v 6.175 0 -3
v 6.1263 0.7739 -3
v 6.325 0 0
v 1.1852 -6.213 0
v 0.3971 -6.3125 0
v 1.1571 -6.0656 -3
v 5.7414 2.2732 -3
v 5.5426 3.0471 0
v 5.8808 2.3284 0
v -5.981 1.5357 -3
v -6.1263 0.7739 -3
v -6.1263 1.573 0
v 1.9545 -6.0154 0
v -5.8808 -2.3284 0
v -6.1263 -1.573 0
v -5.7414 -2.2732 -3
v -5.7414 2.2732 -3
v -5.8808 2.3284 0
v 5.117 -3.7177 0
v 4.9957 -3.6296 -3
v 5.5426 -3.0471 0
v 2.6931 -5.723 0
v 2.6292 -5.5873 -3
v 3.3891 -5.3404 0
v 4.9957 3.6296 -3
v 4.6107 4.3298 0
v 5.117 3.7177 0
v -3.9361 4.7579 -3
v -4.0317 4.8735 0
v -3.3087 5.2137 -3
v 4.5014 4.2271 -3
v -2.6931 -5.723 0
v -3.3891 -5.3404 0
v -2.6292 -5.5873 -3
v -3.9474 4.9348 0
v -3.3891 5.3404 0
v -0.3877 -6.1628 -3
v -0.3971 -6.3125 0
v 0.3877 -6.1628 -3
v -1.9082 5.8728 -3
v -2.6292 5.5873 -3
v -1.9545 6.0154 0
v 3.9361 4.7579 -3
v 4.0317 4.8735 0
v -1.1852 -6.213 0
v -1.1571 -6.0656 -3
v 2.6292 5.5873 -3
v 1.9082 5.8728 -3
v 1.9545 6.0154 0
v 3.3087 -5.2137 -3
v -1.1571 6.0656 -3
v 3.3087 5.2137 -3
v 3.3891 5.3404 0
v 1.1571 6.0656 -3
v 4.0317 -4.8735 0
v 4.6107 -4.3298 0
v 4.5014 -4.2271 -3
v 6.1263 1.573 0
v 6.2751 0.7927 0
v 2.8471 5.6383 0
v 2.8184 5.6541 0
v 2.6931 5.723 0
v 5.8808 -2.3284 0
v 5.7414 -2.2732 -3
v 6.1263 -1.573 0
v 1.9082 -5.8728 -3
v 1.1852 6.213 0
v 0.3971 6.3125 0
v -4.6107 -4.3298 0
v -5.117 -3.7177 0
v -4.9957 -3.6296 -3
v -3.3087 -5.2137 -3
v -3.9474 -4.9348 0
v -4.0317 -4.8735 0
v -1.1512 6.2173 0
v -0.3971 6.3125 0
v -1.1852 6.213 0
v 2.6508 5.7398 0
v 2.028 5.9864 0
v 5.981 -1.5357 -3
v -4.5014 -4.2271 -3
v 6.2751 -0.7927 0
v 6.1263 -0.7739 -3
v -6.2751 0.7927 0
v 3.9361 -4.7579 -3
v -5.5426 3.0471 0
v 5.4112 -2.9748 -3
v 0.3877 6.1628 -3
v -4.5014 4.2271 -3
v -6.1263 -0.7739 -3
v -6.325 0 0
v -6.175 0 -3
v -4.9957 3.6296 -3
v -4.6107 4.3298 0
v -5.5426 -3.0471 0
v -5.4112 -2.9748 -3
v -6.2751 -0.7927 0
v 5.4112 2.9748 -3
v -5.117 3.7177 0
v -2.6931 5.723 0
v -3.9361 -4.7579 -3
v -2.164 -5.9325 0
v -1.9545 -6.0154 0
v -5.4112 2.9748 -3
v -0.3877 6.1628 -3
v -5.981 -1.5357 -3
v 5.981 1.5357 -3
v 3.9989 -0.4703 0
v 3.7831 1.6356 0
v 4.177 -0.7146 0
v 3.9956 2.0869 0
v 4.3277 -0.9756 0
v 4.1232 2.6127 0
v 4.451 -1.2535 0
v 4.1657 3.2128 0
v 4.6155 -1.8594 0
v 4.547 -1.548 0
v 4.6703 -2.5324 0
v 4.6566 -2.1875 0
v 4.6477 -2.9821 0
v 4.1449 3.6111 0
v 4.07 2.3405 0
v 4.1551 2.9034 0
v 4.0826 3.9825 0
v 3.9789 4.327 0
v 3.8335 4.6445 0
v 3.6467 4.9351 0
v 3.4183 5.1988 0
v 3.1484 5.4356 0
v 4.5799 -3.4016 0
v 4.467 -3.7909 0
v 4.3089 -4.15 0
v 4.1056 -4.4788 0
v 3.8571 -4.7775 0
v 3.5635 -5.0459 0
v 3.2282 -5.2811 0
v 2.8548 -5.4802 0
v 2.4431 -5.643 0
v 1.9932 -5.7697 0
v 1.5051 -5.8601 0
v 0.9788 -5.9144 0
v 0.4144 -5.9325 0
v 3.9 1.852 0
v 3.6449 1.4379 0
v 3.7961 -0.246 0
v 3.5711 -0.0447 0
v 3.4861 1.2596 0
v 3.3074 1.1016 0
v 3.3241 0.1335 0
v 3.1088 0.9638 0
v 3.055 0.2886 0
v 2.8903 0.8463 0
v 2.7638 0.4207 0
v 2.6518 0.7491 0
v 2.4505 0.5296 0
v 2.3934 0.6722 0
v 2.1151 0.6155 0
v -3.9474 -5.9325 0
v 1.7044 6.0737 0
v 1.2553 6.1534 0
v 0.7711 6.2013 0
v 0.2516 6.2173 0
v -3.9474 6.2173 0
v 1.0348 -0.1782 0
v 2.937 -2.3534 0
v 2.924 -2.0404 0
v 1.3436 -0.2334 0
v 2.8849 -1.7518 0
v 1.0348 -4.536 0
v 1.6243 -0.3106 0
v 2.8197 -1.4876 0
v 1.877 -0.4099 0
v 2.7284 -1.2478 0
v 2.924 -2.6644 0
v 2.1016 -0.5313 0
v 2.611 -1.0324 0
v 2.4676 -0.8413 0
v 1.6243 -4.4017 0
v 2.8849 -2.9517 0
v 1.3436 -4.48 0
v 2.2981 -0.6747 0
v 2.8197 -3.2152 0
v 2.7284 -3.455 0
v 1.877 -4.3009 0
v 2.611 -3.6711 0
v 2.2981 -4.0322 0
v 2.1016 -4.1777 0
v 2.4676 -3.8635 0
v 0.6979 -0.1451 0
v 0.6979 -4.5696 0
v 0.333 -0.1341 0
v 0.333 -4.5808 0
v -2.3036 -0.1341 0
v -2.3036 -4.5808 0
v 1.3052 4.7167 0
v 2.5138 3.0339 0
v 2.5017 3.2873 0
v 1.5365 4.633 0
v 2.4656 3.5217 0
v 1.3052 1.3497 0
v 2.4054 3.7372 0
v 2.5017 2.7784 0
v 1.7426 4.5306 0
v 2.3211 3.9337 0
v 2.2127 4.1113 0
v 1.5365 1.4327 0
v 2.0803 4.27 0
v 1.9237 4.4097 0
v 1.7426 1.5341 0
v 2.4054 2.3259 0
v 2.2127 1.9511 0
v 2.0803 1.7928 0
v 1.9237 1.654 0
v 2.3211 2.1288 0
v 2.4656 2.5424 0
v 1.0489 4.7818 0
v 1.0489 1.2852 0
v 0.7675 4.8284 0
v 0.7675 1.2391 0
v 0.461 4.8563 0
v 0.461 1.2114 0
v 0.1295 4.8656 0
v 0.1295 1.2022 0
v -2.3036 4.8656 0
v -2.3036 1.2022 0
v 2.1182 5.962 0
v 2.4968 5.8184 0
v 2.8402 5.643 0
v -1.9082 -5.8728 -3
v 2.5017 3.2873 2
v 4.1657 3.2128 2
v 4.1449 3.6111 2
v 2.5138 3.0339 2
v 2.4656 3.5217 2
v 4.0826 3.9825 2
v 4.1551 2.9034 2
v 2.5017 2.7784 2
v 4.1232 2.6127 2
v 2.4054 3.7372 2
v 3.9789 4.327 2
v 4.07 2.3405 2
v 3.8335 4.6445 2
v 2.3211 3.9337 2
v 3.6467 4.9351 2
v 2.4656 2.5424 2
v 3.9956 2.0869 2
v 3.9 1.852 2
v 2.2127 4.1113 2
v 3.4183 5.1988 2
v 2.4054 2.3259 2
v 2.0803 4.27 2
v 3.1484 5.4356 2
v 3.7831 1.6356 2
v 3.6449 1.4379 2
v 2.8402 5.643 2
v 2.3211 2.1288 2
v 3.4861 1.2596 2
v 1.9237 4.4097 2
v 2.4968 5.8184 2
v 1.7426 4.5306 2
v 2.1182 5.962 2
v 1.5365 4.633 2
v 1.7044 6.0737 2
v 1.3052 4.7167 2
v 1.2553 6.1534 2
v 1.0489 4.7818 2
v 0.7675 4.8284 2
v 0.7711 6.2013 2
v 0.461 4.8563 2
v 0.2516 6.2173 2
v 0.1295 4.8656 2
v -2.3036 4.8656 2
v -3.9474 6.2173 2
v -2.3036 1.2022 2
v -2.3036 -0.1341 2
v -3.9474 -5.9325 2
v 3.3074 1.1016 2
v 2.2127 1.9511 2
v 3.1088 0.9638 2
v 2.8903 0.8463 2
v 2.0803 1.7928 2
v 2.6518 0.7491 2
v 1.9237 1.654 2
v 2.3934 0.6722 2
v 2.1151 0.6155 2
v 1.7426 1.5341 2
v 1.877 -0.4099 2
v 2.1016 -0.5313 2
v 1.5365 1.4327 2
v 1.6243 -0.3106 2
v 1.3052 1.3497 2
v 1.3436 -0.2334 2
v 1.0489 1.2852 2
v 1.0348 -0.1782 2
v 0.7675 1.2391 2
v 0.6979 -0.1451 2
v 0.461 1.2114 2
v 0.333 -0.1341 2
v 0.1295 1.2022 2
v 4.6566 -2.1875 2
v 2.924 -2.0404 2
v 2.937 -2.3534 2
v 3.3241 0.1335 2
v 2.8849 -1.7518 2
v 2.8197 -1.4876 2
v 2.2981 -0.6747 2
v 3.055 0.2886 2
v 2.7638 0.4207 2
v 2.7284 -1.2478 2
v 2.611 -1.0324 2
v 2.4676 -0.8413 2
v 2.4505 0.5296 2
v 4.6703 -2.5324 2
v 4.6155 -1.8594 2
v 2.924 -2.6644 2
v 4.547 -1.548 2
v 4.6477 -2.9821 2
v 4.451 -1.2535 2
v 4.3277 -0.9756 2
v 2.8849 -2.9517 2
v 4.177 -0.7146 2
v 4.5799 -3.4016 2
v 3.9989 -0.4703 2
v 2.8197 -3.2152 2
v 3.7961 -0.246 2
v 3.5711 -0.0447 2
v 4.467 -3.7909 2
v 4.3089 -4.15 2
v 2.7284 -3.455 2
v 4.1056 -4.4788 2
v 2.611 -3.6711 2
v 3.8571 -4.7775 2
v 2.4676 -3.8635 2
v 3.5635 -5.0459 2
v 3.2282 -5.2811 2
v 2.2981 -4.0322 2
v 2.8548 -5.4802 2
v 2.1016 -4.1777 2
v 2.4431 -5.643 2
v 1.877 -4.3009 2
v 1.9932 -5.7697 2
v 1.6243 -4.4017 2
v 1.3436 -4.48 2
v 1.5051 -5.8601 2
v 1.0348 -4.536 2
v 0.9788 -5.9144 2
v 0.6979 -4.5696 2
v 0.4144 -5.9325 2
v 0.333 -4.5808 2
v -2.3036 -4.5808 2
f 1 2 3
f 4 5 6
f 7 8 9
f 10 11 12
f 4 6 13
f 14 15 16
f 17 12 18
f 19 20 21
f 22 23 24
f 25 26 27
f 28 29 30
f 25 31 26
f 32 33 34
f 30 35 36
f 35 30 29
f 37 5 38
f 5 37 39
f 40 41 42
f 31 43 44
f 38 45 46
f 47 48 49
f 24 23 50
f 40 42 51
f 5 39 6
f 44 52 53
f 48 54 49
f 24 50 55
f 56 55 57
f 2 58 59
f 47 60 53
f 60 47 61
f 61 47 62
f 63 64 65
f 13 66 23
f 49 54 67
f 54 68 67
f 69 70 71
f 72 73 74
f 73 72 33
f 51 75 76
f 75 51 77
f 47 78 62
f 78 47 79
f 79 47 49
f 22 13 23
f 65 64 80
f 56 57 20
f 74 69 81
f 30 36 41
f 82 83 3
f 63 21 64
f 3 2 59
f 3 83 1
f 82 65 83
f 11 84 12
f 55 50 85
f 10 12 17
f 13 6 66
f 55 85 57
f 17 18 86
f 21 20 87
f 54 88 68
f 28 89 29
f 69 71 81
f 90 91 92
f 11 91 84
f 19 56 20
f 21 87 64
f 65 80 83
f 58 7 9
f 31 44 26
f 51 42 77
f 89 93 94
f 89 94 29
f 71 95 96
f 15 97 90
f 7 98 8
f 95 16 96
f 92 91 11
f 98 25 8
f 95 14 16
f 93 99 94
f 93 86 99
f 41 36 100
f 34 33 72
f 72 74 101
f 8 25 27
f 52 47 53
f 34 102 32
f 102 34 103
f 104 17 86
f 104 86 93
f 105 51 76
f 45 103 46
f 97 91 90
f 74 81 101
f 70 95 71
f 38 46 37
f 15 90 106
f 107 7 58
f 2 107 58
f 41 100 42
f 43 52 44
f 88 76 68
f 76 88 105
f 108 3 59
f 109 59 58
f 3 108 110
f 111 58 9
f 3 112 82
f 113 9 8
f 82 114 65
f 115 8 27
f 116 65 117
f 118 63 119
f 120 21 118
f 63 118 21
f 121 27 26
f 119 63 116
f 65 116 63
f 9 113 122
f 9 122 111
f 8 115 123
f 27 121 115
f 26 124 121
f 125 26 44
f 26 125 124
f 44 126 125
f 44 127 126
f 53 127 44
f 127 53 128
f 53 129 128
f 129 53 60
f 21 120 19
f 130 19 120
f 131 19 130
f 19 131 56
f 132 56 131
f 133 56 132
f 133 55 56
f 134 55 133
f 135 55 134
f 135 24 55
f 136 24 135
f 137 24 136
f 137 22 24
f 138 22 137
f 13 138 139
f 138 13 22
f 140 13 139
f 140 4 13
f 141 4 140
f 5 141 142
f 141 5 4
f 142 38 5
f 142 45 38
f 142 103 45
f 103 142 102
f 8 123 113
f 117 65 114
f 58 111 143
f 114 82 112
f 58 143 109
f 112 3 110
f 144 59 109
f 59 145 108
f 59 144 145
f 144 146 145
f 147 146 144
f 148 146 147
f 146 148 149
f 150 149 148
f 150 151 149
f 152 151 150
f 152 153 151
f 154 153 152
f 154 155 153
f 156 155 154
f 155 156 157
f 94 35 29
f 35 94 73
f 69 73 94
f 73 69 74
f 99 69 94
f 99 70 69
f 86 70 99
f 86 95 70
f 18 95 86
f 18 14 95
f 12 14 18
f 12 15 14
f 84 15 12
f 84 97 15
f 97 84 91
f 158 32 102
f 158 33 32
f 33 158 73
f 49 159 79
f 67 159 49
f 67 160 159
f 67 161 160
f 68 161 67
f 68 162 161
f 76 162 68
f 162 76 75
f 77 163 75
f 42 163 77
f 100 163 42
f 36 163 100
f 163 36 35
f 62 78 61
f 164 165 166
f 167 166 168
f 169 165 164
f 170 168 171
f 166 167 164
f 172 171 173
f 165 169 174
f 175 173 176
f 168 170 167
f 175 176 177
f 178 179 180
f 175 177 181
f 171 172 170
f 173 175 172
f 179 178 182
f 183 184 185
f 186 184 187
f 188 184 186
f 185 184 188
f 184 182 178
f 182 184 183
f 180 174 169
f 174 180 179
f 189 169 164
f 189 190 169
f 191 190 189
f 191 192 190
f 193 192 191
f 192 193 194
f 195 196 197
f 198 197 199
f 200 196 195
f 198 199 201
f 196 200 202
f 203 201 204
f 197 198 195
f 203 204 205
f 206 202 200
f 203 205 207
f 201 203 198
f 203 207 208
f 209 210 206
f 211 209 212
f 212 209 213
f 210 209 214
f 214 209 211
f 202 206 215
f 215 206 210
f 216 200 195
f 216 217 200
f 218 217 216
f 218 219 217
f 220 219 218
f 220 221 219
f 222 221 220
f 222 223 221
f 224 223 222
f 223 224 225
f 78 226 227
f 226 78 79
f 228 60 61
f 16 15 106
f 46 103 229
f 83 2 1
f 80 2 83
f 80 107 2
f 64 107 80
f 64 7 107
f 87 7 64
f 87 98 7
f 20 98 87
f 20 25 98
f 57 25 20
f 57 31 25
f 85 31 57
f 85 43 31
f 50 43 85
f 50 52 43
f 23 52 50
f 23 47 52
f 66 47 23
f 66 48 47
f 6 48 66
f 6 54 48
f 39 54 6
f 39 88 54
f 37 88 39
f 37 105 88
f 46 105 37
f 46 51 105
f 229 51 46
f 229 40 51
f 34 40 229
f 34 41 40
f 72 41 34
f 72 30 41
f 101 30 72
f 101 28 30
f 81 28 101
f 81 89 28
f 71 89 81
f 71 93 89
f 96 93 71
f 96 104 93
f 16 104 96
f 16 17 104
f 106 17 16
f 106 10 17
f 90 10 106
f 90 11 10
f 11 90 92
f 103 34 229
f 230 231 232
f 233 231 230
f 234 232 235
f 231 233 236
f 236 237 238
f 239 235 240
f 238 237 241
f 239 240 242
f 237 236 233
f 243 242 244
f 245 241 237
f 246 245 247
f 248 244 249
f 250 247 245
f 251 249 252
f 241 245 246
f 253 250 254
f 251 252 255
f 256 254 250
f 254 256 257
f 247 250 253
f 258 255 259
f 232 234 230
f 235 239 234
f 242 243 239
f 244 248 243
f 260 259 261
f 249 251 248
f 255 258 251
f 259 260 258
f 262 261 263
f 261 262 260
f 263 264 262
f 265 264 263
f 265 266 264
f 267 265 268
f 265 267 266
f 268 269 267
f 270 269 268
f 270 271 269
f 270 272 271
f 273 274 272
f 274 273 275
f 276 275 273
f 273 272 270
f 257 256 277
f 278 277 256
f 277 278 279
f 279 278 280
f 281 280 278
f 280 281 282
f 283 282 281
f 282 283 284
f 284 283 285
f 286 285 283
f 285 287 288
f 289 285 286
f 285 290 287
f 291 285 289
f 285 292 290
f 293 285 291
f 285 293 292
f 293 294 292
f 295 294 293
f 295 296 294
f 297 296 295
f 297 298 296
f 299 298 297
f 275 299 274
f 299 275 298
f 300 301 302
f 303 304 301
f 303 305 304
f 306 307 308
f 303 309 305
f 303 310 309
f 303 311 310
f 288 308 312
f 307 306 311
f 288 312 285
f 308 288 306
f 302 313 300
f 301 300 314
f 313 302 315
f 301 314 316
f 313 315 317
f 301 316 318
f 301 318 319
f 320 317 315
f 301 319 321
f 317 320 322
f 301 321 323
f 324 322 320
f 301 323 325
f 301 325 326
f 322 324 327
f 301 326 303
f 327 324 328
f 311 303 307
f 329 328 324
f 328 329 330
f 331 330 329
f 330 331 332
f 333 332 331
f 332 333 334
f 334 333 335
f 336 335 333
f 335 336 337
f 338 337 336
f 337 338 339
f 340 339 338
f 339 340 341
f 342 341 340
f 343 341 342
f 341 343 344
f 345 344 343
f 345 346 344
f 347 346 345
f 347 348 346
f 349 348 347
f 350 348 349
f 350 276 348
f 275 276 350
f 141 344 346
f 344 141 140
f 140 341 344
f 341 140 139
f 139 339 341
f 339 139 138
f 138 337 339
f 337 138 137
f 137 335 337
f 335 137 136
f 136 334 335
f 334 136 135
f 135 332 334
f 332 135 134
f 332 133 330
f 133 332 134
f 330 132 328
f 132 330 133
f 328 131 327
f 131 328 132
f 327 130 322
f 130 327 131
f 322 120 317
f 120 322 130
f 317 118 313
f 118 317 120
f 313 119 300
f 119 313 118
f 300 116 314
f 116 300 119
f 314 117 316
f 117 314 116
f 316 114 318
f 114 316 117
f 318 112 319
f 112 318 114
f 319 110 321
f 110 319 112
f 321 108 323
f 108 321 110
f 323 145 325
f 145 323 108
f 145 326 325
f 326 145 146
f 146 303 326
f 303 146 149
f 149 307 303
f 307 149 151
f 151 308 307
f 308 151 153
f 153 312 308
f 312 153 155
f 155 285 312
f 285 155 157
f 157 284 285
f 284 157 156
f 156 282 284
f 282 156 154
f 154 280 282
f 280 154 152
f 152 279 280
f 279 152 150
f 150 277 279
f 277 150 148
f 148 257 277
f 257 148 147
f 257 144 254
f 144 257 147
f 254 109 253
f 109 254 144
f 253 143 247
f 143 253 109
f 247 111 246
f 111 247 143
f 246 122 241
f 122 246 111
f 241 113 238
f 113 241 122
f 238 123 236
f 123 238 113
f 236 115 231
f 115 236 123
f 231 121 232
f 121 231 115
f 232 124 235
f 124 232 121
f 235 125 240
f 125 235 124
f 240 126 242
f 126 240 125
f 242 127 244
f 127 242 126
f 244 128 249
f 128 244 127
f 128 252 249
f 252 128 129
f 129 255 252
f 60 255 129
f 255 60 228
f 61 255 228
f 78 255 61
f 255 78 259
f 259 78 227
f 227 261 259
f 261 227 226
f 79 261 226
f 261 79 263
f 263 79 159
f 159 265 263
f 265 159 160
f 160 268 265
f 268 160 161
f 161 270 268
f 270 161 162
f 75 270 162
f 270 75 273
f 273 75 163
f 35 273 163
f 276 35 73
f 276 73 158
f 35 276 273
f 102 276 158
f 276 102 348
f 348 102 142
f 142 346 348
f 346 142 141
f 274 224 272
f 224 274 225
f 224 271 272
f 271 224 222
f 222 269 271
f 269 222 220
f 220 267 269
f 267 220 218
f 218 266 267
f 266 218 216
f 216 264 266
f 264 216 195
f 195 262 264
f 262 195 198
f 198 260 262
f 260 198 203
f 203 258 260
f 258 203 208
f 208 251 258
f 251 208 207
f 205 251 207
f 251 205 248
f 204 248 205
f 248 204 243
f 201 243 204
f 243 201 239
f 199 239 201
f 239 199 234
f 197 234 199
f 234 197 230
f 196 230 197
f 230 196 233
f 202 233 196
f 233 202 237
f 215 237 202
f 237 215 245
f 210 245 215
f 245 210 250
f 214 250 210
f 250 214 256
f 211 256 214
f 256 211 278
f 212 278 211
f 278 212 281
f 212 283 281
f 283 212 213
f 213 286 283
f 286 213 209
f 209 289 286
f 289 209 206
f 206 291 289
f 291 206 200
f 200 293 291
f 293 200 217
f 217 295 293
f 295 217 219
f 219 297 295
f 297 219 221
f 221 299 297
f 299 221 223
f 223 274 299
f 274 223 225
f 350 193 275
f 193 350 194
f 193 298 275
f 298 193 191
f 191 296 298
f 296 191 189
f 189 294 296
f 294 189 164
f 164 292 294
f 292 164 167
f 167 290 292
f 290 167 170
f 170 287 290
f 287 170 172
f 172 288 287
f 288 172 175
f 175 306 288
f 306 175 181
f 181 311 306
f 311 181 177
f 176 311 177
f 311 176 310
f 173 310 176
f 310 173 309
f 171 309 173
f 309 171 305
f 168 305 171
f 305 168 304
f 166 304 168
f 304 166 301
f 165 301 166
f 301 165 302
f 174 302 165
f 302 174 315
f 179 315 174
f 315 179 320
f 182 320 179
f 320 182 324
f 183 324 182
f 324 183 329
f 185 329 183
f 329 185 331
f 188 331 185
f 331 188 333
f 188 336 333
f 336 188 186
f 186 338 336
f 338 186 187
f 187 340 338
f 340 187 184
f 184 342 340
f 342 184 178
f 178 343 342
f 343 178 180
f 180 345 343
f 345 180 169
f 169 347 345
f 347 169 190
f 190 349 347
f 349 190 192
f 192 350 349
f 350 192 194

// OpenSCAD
$fn = 50;

difference() {
	union() {
		translate(v = [0, 0, -3.0]) {
			cylinder(h = 3, r1 = 6.175, r2 = 6.325);
		}
		linear_extrude(height = 2) {
			text(font = "Impact", halign = "center", size = 12, text = "B", valign = "center");
		}
	}
	union();
}
